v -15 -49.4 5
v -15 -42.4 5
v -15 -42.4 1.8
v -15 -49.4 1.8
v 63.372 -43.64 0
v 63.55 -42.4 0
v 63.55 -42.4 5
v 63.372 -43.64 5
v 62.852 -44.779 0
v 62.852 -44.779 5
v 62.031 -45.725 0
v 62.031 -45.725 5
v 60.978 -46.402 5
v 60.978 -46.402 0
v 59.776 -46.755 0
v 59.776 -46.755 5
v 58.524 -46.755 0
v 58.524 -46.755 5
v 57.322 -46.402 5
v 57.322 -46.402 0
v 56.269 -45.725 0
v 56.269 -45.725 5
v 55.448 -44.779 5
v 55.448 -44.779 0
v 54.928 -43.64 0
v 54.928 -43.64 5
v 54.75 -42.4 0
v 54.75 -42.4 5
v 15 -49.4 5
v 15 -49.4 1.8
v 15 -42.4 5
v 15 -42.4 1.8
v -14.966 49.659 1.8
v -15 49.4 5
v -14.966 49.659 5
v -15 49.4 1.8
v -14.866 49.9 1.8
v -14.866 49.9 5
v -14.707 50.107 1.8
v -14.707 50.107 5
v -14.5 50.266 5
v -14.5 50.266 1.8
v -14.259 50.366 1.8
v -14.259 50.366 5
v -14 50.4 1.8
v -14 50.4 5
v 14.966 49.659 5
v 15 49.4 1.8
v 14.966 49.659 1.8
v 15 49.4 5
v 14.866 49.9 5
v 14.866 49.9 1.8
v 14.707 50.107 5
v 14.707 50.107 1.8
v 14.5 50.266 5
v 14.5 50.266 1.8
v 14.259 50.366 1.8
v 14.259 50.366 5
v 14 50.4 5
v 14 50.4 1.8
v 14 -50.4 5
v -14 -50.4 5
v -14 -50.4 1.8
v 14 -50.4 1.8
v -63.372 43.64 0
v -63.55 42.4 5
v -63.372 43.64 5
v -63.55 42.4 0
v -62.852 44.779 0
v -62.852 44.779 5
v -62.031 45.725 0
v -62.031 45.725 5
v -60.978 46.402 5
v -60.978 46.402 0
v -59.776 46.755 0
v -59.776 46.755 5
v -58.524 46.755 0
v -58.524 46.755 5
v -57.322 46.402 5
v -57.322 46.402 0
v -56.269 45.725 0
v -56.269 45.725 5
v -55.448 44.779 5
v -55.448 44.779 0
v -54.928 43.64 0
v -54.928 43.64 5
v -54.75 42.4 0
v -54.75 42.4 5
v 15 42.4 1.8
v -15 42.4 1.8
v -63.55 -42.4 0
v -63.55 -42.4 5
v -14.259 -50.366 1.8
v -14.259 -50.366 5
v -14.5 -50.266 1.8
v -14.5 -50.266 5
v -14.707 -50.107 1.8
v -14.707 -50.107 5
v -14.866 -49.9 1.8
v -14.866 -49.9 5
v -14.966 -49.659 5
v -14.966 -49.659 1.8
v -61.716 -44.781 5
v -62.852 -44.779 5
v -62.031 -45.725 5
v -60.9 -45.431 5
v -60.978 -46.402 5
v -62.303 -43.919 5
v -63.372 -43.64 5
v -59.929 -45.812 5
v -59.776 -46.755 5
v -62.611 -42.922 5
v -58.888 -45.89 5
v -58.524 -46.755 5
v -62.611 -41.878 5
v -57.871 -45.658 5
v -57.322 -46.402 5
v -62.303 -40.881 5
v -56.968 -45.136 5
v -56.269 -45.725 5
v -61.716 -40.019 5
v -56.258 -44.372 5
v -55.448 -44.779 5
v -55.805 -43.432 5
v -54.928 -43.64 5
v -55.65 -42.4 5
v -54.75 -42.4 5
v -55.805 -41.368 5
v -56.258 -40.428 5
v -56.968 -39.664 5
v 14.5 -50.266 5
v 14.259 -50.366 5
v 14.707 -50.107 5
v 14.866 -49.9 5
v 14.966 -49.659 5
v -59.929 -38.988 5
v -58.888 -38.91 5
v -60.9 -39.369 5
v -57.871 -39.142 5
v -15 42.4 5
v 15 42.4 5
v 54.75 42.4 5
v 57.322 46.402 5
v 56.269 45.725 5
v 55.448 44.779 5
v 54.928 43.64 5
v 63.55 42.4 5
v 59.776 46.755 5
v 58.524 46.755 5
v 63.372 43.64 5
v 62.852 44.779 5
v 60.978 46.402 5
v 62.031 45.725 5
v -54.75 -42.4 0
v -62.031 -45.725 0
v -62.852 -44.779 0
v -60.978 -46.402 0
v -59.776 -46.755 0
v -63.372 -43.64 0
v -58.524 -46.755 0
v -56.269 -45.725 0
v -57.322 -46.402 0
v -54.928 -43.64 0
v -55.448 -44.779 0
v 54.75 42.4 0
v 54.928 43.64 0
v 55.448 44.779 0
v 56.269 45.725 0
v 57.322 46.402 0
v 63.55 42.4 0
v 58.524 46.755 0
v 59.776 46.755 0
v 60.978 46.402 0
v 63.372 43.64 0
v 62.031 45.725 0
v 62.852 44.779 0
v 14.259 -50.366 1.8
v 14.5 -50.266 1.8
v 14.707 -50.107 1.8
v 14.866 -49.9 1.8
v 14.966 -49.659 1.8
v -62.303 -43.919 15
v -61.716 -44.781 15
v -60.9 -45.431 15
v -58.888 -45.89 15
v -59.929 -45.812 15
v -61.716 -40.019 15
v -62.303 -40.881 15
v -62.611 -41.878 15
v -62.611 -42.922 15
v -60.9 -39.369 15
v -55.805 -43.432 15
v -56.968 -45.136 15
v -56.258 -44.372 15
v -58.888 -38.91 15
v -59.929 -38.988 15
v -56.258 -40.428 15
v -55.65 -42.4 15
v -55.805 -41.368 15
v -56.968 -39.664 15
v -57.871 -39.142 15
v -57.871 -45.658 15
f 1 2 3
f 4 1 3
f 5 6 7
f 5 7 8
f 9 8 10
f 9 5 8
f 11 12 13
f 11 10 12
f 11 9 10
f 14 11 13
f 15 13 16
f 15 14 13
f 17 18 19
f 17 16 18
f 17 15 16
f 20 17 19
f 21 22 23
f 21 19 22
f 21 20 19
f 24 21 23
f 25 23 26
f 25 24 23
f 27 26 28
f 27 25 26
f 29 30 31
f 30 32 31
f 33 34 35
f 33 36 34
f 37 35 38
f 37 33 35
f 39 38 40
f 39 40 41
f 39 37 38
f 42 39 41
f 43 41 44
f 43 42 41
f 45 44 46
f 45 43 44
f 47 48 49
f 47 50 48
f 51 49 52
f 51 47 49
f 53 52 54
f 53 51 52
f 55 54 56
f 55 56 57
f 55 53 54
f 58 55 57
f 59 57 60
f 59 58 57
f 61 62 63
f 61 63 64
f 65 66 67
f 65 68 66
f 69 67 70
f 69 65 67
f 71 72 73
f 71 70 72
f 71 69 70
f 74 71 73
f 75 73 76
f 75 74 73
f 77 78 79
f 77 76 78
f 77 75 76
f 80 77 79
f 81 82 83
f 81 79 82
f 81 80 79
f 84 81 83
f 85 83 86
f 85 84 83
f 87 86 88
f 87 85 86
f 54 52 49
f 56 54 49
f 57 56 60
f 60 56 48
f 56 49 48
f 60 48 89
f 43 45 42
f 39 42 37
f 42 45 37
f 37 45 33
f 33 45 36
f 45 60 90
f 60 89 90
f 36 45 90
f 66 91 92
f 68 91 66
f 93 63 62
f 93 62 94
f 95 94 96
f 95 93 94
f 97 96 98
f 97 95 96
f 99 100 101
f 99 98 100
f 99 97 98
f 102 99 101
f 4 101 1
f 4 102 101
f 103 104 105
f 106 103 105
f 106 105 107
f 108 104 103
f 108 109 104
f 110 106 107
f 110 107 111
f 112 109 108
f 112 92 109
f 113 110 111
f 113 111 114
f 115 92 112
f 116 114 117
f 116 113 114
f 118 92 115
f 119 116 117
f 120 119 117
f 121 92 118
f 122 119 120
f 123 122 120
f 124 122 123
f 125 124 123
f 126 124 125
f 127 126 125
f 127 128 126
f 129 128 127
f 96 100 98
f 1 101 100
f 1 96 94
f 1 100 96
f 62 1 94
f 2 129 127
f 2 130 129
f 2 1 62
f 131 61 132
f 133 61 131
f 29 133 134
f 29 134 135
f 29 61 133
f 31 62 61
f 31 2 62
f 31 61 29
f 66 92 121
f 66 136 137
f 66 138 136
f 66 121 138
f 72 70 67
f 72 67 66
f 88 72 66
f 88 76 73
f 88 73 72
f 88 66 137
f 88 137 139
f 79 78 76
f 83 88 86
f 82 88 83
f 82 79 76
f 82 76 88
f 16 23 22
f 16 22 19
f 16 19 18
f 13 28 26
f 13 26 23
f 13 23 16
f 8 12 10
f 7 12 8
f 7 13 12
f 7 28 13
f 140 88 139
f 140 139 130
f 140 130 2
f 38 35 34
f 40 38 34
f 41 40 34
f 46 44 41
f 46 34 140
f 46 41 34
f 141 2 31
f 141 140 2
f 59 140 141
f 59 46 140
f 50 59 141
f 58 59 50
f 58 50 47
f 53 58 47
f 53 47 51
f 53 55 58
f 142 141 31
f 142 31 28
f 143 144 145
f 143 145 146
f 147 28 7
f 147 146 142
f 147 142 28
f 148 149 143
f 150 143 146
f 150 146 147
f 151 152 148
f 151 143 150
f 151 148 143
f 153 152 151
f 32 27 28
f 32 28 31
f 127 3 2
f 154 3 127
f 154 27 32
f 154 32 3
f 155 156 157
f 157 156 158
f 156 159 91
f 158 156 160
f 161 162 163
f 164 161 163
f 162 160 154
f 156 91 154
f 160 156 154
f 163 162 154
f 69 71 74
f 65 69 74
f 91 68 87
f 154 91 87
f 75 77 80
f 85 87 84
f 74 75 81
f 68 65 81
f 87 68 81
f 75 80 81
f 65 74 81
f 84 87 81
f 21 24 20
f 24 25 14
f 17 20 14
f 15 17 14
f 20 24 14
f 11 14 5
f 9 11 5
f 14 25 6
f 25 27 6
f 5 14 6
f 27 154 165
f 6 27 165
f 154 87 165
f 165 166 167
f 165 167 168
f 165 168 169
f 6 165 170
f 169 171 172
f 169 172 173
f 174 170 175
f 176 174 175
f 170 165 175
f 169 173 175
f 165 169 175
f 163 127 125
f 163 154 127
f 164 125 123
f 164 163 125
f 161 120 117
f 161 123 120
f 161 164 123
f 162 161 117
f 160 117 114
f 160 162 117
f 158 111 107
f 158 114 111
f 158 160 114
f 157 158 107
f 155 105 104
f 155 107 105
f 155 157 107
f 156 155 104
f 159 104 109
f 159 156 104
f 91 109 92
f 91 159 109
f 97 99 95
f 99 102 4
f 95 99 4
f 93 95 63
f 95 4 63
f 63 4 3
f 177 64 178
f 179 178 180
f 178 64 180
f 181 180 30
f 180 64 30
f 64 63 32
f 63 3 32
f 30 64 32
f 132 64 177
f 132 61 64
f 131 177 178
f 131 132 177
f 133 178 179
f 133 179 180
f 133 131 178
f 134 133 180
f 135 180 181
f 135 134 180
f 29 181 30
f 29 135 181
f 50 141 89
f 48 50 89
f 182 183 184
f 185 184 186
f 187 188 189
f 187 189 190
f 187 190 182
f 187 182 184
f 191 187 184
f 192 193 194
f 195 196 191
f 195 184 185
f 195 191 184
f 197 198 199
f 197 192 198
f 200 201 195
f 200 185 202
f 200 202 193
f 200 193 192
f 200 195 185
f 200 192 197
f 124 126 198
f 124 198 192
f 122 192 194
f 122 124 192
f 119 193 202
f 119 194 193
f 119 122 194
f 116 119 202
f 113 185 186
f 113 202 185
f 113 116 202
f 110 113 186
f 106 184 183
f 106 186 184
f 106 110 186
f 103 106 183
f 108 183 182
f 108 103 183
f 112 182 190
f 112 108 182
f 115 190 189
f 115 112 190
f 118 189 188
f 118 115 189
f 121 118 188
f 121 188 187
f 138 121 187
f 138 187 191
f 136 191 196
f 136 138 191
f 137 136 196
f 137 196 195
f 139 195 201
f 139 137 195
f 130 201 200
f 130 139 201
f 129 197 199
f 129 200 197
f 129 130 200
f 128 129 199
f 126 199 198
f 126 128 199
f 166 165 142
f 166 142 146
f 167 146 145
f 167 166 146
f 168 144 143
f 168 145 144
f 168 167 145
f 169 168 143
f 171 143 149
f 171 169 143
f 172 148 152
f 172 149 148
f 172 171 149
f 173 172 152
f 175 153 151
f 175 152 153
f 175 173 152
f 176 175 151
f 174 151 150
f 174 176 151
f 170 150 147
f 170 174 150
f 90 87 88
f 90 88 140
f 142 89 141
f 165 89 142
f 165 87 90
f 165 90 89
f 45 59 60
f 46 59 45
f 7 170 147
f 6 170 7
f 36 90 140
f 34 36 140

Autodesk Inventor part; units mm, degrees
ref_plane "YZ Plane" through (0, 0, 0) normal (1, 0, 0) x (0, 1, 0)
ref_plane "XZ Plane" through (0, 0, 0) normal (0, 1, 0) x (-1, 0, 0)
ref_plane "XY Plane" through (0, 0, 0) normal (0, 0, 1) x (1, 0, 0)
sketch "Sketch1" plane through (0, 0, 0) normal (0, 0, 1) x (1, 0, 0)
  line L0 (-54.75, 42.4) -> (54.75, 42.4)
  line L1 (63.55, 42.4) -> (63.55, -42.4)
  line L2 (54.75, -42.4) -> (-54.75, -42.4)
  line L3 (-63.55, -42.4) -> (-63.55, 42.4)
  line L4 (-63.55, 42.4) -> (63.55, -42.4) construction
  line L5 (63.55, 42.4) -> (-63.55, -42.4) construction
  arc A0 (63.55, 42.4) -> (54.75, 42.4) centre (59.15, 42.4) ccw
  line L6 (-63.55, 0) -> (63.55, 0) construction
  line L7 (-8.8, 42.4) -> (-8.8, -42.4) construction
  line L8 (-63.55, 42.4) -> (-54.75, 42.4) construction
  line L9 (-54.75, 42.4) -> (-54.75, 42.4) construction
  arc A1 (-63.55, -42.4) -> (-54.75, -42.4) centre (-59.15, -42.4) ccw
  arc A2 (54.75, -42.4) -> (63.55, -42.4) centre (59.15, -42.4) ccw
  arc A3 (-54.75, 42.4) -> (-63.55, 42.4) centre (-59.15, 42.4) ccw
  point P0 (0, 0)
  dimension "d2" = 127.1
  dimension "d4" = 84.8
  dimension "d10" = 4.4
extrude "Extrusion2" add sketch "Sketch1" along normal blind 5
sketch "Sketch2" plane through (0, 0, 5) normal (0, 0, 1) x (1, 0, 0)
  arc A0 (-63.55, -42.4) -> (-54.75, -42.4) centre (-59.15, -42.4) ccw projected
  circle A1 centre (-59.15, -42.4) radius 3.5
  point P0 (0, 0)
  dimension "d14" = 7
extrude "Extrusion3" add sketch "Sketch2" along normal blind 10
sketch "Sketch3" plane through (-54.75, -42.4, 0) normal (0, -1, 0) x (1, 0, 0)
  line L0 (0, 5) -> (109.5, 5) projected
  line L1 (0, 0) -> (0, 5) projected
  line L2 (54.75, 0) -> (54.75, 1.8) construction
  line L3 (54.75, 1.8) -> (69.75, 1.8)
  line L4 (69.75, 1.8) -> (69.75, 5)
  line L5 (39.75, 5) -> (39.75, 1.8)
  line L6 (39.75, 1.8) -> (54.75, 1.8)
  dimension "d18" = 1.8
  dimension "d19" = 15
extrude "Extrusion4" add sketch "Sketch3" along normal blind 8
ref_plane "Work Plane1" through (-54.75, 0, 0) normal (0, -1, 0) x (1, 0, 0)
mirror "Mirror1" about plane through (-54.75, 0, 0) normal (0, -1, 0) of "Extrusion4"
fillet "Fillet1" radius 1 4 edges at (-15, -50.4, 3.4) (15, -50.4, 3.4) (15, 50.4, 3.4) (-15, 50.4, 3.4)
properties part number "BaseTI stage insert"
